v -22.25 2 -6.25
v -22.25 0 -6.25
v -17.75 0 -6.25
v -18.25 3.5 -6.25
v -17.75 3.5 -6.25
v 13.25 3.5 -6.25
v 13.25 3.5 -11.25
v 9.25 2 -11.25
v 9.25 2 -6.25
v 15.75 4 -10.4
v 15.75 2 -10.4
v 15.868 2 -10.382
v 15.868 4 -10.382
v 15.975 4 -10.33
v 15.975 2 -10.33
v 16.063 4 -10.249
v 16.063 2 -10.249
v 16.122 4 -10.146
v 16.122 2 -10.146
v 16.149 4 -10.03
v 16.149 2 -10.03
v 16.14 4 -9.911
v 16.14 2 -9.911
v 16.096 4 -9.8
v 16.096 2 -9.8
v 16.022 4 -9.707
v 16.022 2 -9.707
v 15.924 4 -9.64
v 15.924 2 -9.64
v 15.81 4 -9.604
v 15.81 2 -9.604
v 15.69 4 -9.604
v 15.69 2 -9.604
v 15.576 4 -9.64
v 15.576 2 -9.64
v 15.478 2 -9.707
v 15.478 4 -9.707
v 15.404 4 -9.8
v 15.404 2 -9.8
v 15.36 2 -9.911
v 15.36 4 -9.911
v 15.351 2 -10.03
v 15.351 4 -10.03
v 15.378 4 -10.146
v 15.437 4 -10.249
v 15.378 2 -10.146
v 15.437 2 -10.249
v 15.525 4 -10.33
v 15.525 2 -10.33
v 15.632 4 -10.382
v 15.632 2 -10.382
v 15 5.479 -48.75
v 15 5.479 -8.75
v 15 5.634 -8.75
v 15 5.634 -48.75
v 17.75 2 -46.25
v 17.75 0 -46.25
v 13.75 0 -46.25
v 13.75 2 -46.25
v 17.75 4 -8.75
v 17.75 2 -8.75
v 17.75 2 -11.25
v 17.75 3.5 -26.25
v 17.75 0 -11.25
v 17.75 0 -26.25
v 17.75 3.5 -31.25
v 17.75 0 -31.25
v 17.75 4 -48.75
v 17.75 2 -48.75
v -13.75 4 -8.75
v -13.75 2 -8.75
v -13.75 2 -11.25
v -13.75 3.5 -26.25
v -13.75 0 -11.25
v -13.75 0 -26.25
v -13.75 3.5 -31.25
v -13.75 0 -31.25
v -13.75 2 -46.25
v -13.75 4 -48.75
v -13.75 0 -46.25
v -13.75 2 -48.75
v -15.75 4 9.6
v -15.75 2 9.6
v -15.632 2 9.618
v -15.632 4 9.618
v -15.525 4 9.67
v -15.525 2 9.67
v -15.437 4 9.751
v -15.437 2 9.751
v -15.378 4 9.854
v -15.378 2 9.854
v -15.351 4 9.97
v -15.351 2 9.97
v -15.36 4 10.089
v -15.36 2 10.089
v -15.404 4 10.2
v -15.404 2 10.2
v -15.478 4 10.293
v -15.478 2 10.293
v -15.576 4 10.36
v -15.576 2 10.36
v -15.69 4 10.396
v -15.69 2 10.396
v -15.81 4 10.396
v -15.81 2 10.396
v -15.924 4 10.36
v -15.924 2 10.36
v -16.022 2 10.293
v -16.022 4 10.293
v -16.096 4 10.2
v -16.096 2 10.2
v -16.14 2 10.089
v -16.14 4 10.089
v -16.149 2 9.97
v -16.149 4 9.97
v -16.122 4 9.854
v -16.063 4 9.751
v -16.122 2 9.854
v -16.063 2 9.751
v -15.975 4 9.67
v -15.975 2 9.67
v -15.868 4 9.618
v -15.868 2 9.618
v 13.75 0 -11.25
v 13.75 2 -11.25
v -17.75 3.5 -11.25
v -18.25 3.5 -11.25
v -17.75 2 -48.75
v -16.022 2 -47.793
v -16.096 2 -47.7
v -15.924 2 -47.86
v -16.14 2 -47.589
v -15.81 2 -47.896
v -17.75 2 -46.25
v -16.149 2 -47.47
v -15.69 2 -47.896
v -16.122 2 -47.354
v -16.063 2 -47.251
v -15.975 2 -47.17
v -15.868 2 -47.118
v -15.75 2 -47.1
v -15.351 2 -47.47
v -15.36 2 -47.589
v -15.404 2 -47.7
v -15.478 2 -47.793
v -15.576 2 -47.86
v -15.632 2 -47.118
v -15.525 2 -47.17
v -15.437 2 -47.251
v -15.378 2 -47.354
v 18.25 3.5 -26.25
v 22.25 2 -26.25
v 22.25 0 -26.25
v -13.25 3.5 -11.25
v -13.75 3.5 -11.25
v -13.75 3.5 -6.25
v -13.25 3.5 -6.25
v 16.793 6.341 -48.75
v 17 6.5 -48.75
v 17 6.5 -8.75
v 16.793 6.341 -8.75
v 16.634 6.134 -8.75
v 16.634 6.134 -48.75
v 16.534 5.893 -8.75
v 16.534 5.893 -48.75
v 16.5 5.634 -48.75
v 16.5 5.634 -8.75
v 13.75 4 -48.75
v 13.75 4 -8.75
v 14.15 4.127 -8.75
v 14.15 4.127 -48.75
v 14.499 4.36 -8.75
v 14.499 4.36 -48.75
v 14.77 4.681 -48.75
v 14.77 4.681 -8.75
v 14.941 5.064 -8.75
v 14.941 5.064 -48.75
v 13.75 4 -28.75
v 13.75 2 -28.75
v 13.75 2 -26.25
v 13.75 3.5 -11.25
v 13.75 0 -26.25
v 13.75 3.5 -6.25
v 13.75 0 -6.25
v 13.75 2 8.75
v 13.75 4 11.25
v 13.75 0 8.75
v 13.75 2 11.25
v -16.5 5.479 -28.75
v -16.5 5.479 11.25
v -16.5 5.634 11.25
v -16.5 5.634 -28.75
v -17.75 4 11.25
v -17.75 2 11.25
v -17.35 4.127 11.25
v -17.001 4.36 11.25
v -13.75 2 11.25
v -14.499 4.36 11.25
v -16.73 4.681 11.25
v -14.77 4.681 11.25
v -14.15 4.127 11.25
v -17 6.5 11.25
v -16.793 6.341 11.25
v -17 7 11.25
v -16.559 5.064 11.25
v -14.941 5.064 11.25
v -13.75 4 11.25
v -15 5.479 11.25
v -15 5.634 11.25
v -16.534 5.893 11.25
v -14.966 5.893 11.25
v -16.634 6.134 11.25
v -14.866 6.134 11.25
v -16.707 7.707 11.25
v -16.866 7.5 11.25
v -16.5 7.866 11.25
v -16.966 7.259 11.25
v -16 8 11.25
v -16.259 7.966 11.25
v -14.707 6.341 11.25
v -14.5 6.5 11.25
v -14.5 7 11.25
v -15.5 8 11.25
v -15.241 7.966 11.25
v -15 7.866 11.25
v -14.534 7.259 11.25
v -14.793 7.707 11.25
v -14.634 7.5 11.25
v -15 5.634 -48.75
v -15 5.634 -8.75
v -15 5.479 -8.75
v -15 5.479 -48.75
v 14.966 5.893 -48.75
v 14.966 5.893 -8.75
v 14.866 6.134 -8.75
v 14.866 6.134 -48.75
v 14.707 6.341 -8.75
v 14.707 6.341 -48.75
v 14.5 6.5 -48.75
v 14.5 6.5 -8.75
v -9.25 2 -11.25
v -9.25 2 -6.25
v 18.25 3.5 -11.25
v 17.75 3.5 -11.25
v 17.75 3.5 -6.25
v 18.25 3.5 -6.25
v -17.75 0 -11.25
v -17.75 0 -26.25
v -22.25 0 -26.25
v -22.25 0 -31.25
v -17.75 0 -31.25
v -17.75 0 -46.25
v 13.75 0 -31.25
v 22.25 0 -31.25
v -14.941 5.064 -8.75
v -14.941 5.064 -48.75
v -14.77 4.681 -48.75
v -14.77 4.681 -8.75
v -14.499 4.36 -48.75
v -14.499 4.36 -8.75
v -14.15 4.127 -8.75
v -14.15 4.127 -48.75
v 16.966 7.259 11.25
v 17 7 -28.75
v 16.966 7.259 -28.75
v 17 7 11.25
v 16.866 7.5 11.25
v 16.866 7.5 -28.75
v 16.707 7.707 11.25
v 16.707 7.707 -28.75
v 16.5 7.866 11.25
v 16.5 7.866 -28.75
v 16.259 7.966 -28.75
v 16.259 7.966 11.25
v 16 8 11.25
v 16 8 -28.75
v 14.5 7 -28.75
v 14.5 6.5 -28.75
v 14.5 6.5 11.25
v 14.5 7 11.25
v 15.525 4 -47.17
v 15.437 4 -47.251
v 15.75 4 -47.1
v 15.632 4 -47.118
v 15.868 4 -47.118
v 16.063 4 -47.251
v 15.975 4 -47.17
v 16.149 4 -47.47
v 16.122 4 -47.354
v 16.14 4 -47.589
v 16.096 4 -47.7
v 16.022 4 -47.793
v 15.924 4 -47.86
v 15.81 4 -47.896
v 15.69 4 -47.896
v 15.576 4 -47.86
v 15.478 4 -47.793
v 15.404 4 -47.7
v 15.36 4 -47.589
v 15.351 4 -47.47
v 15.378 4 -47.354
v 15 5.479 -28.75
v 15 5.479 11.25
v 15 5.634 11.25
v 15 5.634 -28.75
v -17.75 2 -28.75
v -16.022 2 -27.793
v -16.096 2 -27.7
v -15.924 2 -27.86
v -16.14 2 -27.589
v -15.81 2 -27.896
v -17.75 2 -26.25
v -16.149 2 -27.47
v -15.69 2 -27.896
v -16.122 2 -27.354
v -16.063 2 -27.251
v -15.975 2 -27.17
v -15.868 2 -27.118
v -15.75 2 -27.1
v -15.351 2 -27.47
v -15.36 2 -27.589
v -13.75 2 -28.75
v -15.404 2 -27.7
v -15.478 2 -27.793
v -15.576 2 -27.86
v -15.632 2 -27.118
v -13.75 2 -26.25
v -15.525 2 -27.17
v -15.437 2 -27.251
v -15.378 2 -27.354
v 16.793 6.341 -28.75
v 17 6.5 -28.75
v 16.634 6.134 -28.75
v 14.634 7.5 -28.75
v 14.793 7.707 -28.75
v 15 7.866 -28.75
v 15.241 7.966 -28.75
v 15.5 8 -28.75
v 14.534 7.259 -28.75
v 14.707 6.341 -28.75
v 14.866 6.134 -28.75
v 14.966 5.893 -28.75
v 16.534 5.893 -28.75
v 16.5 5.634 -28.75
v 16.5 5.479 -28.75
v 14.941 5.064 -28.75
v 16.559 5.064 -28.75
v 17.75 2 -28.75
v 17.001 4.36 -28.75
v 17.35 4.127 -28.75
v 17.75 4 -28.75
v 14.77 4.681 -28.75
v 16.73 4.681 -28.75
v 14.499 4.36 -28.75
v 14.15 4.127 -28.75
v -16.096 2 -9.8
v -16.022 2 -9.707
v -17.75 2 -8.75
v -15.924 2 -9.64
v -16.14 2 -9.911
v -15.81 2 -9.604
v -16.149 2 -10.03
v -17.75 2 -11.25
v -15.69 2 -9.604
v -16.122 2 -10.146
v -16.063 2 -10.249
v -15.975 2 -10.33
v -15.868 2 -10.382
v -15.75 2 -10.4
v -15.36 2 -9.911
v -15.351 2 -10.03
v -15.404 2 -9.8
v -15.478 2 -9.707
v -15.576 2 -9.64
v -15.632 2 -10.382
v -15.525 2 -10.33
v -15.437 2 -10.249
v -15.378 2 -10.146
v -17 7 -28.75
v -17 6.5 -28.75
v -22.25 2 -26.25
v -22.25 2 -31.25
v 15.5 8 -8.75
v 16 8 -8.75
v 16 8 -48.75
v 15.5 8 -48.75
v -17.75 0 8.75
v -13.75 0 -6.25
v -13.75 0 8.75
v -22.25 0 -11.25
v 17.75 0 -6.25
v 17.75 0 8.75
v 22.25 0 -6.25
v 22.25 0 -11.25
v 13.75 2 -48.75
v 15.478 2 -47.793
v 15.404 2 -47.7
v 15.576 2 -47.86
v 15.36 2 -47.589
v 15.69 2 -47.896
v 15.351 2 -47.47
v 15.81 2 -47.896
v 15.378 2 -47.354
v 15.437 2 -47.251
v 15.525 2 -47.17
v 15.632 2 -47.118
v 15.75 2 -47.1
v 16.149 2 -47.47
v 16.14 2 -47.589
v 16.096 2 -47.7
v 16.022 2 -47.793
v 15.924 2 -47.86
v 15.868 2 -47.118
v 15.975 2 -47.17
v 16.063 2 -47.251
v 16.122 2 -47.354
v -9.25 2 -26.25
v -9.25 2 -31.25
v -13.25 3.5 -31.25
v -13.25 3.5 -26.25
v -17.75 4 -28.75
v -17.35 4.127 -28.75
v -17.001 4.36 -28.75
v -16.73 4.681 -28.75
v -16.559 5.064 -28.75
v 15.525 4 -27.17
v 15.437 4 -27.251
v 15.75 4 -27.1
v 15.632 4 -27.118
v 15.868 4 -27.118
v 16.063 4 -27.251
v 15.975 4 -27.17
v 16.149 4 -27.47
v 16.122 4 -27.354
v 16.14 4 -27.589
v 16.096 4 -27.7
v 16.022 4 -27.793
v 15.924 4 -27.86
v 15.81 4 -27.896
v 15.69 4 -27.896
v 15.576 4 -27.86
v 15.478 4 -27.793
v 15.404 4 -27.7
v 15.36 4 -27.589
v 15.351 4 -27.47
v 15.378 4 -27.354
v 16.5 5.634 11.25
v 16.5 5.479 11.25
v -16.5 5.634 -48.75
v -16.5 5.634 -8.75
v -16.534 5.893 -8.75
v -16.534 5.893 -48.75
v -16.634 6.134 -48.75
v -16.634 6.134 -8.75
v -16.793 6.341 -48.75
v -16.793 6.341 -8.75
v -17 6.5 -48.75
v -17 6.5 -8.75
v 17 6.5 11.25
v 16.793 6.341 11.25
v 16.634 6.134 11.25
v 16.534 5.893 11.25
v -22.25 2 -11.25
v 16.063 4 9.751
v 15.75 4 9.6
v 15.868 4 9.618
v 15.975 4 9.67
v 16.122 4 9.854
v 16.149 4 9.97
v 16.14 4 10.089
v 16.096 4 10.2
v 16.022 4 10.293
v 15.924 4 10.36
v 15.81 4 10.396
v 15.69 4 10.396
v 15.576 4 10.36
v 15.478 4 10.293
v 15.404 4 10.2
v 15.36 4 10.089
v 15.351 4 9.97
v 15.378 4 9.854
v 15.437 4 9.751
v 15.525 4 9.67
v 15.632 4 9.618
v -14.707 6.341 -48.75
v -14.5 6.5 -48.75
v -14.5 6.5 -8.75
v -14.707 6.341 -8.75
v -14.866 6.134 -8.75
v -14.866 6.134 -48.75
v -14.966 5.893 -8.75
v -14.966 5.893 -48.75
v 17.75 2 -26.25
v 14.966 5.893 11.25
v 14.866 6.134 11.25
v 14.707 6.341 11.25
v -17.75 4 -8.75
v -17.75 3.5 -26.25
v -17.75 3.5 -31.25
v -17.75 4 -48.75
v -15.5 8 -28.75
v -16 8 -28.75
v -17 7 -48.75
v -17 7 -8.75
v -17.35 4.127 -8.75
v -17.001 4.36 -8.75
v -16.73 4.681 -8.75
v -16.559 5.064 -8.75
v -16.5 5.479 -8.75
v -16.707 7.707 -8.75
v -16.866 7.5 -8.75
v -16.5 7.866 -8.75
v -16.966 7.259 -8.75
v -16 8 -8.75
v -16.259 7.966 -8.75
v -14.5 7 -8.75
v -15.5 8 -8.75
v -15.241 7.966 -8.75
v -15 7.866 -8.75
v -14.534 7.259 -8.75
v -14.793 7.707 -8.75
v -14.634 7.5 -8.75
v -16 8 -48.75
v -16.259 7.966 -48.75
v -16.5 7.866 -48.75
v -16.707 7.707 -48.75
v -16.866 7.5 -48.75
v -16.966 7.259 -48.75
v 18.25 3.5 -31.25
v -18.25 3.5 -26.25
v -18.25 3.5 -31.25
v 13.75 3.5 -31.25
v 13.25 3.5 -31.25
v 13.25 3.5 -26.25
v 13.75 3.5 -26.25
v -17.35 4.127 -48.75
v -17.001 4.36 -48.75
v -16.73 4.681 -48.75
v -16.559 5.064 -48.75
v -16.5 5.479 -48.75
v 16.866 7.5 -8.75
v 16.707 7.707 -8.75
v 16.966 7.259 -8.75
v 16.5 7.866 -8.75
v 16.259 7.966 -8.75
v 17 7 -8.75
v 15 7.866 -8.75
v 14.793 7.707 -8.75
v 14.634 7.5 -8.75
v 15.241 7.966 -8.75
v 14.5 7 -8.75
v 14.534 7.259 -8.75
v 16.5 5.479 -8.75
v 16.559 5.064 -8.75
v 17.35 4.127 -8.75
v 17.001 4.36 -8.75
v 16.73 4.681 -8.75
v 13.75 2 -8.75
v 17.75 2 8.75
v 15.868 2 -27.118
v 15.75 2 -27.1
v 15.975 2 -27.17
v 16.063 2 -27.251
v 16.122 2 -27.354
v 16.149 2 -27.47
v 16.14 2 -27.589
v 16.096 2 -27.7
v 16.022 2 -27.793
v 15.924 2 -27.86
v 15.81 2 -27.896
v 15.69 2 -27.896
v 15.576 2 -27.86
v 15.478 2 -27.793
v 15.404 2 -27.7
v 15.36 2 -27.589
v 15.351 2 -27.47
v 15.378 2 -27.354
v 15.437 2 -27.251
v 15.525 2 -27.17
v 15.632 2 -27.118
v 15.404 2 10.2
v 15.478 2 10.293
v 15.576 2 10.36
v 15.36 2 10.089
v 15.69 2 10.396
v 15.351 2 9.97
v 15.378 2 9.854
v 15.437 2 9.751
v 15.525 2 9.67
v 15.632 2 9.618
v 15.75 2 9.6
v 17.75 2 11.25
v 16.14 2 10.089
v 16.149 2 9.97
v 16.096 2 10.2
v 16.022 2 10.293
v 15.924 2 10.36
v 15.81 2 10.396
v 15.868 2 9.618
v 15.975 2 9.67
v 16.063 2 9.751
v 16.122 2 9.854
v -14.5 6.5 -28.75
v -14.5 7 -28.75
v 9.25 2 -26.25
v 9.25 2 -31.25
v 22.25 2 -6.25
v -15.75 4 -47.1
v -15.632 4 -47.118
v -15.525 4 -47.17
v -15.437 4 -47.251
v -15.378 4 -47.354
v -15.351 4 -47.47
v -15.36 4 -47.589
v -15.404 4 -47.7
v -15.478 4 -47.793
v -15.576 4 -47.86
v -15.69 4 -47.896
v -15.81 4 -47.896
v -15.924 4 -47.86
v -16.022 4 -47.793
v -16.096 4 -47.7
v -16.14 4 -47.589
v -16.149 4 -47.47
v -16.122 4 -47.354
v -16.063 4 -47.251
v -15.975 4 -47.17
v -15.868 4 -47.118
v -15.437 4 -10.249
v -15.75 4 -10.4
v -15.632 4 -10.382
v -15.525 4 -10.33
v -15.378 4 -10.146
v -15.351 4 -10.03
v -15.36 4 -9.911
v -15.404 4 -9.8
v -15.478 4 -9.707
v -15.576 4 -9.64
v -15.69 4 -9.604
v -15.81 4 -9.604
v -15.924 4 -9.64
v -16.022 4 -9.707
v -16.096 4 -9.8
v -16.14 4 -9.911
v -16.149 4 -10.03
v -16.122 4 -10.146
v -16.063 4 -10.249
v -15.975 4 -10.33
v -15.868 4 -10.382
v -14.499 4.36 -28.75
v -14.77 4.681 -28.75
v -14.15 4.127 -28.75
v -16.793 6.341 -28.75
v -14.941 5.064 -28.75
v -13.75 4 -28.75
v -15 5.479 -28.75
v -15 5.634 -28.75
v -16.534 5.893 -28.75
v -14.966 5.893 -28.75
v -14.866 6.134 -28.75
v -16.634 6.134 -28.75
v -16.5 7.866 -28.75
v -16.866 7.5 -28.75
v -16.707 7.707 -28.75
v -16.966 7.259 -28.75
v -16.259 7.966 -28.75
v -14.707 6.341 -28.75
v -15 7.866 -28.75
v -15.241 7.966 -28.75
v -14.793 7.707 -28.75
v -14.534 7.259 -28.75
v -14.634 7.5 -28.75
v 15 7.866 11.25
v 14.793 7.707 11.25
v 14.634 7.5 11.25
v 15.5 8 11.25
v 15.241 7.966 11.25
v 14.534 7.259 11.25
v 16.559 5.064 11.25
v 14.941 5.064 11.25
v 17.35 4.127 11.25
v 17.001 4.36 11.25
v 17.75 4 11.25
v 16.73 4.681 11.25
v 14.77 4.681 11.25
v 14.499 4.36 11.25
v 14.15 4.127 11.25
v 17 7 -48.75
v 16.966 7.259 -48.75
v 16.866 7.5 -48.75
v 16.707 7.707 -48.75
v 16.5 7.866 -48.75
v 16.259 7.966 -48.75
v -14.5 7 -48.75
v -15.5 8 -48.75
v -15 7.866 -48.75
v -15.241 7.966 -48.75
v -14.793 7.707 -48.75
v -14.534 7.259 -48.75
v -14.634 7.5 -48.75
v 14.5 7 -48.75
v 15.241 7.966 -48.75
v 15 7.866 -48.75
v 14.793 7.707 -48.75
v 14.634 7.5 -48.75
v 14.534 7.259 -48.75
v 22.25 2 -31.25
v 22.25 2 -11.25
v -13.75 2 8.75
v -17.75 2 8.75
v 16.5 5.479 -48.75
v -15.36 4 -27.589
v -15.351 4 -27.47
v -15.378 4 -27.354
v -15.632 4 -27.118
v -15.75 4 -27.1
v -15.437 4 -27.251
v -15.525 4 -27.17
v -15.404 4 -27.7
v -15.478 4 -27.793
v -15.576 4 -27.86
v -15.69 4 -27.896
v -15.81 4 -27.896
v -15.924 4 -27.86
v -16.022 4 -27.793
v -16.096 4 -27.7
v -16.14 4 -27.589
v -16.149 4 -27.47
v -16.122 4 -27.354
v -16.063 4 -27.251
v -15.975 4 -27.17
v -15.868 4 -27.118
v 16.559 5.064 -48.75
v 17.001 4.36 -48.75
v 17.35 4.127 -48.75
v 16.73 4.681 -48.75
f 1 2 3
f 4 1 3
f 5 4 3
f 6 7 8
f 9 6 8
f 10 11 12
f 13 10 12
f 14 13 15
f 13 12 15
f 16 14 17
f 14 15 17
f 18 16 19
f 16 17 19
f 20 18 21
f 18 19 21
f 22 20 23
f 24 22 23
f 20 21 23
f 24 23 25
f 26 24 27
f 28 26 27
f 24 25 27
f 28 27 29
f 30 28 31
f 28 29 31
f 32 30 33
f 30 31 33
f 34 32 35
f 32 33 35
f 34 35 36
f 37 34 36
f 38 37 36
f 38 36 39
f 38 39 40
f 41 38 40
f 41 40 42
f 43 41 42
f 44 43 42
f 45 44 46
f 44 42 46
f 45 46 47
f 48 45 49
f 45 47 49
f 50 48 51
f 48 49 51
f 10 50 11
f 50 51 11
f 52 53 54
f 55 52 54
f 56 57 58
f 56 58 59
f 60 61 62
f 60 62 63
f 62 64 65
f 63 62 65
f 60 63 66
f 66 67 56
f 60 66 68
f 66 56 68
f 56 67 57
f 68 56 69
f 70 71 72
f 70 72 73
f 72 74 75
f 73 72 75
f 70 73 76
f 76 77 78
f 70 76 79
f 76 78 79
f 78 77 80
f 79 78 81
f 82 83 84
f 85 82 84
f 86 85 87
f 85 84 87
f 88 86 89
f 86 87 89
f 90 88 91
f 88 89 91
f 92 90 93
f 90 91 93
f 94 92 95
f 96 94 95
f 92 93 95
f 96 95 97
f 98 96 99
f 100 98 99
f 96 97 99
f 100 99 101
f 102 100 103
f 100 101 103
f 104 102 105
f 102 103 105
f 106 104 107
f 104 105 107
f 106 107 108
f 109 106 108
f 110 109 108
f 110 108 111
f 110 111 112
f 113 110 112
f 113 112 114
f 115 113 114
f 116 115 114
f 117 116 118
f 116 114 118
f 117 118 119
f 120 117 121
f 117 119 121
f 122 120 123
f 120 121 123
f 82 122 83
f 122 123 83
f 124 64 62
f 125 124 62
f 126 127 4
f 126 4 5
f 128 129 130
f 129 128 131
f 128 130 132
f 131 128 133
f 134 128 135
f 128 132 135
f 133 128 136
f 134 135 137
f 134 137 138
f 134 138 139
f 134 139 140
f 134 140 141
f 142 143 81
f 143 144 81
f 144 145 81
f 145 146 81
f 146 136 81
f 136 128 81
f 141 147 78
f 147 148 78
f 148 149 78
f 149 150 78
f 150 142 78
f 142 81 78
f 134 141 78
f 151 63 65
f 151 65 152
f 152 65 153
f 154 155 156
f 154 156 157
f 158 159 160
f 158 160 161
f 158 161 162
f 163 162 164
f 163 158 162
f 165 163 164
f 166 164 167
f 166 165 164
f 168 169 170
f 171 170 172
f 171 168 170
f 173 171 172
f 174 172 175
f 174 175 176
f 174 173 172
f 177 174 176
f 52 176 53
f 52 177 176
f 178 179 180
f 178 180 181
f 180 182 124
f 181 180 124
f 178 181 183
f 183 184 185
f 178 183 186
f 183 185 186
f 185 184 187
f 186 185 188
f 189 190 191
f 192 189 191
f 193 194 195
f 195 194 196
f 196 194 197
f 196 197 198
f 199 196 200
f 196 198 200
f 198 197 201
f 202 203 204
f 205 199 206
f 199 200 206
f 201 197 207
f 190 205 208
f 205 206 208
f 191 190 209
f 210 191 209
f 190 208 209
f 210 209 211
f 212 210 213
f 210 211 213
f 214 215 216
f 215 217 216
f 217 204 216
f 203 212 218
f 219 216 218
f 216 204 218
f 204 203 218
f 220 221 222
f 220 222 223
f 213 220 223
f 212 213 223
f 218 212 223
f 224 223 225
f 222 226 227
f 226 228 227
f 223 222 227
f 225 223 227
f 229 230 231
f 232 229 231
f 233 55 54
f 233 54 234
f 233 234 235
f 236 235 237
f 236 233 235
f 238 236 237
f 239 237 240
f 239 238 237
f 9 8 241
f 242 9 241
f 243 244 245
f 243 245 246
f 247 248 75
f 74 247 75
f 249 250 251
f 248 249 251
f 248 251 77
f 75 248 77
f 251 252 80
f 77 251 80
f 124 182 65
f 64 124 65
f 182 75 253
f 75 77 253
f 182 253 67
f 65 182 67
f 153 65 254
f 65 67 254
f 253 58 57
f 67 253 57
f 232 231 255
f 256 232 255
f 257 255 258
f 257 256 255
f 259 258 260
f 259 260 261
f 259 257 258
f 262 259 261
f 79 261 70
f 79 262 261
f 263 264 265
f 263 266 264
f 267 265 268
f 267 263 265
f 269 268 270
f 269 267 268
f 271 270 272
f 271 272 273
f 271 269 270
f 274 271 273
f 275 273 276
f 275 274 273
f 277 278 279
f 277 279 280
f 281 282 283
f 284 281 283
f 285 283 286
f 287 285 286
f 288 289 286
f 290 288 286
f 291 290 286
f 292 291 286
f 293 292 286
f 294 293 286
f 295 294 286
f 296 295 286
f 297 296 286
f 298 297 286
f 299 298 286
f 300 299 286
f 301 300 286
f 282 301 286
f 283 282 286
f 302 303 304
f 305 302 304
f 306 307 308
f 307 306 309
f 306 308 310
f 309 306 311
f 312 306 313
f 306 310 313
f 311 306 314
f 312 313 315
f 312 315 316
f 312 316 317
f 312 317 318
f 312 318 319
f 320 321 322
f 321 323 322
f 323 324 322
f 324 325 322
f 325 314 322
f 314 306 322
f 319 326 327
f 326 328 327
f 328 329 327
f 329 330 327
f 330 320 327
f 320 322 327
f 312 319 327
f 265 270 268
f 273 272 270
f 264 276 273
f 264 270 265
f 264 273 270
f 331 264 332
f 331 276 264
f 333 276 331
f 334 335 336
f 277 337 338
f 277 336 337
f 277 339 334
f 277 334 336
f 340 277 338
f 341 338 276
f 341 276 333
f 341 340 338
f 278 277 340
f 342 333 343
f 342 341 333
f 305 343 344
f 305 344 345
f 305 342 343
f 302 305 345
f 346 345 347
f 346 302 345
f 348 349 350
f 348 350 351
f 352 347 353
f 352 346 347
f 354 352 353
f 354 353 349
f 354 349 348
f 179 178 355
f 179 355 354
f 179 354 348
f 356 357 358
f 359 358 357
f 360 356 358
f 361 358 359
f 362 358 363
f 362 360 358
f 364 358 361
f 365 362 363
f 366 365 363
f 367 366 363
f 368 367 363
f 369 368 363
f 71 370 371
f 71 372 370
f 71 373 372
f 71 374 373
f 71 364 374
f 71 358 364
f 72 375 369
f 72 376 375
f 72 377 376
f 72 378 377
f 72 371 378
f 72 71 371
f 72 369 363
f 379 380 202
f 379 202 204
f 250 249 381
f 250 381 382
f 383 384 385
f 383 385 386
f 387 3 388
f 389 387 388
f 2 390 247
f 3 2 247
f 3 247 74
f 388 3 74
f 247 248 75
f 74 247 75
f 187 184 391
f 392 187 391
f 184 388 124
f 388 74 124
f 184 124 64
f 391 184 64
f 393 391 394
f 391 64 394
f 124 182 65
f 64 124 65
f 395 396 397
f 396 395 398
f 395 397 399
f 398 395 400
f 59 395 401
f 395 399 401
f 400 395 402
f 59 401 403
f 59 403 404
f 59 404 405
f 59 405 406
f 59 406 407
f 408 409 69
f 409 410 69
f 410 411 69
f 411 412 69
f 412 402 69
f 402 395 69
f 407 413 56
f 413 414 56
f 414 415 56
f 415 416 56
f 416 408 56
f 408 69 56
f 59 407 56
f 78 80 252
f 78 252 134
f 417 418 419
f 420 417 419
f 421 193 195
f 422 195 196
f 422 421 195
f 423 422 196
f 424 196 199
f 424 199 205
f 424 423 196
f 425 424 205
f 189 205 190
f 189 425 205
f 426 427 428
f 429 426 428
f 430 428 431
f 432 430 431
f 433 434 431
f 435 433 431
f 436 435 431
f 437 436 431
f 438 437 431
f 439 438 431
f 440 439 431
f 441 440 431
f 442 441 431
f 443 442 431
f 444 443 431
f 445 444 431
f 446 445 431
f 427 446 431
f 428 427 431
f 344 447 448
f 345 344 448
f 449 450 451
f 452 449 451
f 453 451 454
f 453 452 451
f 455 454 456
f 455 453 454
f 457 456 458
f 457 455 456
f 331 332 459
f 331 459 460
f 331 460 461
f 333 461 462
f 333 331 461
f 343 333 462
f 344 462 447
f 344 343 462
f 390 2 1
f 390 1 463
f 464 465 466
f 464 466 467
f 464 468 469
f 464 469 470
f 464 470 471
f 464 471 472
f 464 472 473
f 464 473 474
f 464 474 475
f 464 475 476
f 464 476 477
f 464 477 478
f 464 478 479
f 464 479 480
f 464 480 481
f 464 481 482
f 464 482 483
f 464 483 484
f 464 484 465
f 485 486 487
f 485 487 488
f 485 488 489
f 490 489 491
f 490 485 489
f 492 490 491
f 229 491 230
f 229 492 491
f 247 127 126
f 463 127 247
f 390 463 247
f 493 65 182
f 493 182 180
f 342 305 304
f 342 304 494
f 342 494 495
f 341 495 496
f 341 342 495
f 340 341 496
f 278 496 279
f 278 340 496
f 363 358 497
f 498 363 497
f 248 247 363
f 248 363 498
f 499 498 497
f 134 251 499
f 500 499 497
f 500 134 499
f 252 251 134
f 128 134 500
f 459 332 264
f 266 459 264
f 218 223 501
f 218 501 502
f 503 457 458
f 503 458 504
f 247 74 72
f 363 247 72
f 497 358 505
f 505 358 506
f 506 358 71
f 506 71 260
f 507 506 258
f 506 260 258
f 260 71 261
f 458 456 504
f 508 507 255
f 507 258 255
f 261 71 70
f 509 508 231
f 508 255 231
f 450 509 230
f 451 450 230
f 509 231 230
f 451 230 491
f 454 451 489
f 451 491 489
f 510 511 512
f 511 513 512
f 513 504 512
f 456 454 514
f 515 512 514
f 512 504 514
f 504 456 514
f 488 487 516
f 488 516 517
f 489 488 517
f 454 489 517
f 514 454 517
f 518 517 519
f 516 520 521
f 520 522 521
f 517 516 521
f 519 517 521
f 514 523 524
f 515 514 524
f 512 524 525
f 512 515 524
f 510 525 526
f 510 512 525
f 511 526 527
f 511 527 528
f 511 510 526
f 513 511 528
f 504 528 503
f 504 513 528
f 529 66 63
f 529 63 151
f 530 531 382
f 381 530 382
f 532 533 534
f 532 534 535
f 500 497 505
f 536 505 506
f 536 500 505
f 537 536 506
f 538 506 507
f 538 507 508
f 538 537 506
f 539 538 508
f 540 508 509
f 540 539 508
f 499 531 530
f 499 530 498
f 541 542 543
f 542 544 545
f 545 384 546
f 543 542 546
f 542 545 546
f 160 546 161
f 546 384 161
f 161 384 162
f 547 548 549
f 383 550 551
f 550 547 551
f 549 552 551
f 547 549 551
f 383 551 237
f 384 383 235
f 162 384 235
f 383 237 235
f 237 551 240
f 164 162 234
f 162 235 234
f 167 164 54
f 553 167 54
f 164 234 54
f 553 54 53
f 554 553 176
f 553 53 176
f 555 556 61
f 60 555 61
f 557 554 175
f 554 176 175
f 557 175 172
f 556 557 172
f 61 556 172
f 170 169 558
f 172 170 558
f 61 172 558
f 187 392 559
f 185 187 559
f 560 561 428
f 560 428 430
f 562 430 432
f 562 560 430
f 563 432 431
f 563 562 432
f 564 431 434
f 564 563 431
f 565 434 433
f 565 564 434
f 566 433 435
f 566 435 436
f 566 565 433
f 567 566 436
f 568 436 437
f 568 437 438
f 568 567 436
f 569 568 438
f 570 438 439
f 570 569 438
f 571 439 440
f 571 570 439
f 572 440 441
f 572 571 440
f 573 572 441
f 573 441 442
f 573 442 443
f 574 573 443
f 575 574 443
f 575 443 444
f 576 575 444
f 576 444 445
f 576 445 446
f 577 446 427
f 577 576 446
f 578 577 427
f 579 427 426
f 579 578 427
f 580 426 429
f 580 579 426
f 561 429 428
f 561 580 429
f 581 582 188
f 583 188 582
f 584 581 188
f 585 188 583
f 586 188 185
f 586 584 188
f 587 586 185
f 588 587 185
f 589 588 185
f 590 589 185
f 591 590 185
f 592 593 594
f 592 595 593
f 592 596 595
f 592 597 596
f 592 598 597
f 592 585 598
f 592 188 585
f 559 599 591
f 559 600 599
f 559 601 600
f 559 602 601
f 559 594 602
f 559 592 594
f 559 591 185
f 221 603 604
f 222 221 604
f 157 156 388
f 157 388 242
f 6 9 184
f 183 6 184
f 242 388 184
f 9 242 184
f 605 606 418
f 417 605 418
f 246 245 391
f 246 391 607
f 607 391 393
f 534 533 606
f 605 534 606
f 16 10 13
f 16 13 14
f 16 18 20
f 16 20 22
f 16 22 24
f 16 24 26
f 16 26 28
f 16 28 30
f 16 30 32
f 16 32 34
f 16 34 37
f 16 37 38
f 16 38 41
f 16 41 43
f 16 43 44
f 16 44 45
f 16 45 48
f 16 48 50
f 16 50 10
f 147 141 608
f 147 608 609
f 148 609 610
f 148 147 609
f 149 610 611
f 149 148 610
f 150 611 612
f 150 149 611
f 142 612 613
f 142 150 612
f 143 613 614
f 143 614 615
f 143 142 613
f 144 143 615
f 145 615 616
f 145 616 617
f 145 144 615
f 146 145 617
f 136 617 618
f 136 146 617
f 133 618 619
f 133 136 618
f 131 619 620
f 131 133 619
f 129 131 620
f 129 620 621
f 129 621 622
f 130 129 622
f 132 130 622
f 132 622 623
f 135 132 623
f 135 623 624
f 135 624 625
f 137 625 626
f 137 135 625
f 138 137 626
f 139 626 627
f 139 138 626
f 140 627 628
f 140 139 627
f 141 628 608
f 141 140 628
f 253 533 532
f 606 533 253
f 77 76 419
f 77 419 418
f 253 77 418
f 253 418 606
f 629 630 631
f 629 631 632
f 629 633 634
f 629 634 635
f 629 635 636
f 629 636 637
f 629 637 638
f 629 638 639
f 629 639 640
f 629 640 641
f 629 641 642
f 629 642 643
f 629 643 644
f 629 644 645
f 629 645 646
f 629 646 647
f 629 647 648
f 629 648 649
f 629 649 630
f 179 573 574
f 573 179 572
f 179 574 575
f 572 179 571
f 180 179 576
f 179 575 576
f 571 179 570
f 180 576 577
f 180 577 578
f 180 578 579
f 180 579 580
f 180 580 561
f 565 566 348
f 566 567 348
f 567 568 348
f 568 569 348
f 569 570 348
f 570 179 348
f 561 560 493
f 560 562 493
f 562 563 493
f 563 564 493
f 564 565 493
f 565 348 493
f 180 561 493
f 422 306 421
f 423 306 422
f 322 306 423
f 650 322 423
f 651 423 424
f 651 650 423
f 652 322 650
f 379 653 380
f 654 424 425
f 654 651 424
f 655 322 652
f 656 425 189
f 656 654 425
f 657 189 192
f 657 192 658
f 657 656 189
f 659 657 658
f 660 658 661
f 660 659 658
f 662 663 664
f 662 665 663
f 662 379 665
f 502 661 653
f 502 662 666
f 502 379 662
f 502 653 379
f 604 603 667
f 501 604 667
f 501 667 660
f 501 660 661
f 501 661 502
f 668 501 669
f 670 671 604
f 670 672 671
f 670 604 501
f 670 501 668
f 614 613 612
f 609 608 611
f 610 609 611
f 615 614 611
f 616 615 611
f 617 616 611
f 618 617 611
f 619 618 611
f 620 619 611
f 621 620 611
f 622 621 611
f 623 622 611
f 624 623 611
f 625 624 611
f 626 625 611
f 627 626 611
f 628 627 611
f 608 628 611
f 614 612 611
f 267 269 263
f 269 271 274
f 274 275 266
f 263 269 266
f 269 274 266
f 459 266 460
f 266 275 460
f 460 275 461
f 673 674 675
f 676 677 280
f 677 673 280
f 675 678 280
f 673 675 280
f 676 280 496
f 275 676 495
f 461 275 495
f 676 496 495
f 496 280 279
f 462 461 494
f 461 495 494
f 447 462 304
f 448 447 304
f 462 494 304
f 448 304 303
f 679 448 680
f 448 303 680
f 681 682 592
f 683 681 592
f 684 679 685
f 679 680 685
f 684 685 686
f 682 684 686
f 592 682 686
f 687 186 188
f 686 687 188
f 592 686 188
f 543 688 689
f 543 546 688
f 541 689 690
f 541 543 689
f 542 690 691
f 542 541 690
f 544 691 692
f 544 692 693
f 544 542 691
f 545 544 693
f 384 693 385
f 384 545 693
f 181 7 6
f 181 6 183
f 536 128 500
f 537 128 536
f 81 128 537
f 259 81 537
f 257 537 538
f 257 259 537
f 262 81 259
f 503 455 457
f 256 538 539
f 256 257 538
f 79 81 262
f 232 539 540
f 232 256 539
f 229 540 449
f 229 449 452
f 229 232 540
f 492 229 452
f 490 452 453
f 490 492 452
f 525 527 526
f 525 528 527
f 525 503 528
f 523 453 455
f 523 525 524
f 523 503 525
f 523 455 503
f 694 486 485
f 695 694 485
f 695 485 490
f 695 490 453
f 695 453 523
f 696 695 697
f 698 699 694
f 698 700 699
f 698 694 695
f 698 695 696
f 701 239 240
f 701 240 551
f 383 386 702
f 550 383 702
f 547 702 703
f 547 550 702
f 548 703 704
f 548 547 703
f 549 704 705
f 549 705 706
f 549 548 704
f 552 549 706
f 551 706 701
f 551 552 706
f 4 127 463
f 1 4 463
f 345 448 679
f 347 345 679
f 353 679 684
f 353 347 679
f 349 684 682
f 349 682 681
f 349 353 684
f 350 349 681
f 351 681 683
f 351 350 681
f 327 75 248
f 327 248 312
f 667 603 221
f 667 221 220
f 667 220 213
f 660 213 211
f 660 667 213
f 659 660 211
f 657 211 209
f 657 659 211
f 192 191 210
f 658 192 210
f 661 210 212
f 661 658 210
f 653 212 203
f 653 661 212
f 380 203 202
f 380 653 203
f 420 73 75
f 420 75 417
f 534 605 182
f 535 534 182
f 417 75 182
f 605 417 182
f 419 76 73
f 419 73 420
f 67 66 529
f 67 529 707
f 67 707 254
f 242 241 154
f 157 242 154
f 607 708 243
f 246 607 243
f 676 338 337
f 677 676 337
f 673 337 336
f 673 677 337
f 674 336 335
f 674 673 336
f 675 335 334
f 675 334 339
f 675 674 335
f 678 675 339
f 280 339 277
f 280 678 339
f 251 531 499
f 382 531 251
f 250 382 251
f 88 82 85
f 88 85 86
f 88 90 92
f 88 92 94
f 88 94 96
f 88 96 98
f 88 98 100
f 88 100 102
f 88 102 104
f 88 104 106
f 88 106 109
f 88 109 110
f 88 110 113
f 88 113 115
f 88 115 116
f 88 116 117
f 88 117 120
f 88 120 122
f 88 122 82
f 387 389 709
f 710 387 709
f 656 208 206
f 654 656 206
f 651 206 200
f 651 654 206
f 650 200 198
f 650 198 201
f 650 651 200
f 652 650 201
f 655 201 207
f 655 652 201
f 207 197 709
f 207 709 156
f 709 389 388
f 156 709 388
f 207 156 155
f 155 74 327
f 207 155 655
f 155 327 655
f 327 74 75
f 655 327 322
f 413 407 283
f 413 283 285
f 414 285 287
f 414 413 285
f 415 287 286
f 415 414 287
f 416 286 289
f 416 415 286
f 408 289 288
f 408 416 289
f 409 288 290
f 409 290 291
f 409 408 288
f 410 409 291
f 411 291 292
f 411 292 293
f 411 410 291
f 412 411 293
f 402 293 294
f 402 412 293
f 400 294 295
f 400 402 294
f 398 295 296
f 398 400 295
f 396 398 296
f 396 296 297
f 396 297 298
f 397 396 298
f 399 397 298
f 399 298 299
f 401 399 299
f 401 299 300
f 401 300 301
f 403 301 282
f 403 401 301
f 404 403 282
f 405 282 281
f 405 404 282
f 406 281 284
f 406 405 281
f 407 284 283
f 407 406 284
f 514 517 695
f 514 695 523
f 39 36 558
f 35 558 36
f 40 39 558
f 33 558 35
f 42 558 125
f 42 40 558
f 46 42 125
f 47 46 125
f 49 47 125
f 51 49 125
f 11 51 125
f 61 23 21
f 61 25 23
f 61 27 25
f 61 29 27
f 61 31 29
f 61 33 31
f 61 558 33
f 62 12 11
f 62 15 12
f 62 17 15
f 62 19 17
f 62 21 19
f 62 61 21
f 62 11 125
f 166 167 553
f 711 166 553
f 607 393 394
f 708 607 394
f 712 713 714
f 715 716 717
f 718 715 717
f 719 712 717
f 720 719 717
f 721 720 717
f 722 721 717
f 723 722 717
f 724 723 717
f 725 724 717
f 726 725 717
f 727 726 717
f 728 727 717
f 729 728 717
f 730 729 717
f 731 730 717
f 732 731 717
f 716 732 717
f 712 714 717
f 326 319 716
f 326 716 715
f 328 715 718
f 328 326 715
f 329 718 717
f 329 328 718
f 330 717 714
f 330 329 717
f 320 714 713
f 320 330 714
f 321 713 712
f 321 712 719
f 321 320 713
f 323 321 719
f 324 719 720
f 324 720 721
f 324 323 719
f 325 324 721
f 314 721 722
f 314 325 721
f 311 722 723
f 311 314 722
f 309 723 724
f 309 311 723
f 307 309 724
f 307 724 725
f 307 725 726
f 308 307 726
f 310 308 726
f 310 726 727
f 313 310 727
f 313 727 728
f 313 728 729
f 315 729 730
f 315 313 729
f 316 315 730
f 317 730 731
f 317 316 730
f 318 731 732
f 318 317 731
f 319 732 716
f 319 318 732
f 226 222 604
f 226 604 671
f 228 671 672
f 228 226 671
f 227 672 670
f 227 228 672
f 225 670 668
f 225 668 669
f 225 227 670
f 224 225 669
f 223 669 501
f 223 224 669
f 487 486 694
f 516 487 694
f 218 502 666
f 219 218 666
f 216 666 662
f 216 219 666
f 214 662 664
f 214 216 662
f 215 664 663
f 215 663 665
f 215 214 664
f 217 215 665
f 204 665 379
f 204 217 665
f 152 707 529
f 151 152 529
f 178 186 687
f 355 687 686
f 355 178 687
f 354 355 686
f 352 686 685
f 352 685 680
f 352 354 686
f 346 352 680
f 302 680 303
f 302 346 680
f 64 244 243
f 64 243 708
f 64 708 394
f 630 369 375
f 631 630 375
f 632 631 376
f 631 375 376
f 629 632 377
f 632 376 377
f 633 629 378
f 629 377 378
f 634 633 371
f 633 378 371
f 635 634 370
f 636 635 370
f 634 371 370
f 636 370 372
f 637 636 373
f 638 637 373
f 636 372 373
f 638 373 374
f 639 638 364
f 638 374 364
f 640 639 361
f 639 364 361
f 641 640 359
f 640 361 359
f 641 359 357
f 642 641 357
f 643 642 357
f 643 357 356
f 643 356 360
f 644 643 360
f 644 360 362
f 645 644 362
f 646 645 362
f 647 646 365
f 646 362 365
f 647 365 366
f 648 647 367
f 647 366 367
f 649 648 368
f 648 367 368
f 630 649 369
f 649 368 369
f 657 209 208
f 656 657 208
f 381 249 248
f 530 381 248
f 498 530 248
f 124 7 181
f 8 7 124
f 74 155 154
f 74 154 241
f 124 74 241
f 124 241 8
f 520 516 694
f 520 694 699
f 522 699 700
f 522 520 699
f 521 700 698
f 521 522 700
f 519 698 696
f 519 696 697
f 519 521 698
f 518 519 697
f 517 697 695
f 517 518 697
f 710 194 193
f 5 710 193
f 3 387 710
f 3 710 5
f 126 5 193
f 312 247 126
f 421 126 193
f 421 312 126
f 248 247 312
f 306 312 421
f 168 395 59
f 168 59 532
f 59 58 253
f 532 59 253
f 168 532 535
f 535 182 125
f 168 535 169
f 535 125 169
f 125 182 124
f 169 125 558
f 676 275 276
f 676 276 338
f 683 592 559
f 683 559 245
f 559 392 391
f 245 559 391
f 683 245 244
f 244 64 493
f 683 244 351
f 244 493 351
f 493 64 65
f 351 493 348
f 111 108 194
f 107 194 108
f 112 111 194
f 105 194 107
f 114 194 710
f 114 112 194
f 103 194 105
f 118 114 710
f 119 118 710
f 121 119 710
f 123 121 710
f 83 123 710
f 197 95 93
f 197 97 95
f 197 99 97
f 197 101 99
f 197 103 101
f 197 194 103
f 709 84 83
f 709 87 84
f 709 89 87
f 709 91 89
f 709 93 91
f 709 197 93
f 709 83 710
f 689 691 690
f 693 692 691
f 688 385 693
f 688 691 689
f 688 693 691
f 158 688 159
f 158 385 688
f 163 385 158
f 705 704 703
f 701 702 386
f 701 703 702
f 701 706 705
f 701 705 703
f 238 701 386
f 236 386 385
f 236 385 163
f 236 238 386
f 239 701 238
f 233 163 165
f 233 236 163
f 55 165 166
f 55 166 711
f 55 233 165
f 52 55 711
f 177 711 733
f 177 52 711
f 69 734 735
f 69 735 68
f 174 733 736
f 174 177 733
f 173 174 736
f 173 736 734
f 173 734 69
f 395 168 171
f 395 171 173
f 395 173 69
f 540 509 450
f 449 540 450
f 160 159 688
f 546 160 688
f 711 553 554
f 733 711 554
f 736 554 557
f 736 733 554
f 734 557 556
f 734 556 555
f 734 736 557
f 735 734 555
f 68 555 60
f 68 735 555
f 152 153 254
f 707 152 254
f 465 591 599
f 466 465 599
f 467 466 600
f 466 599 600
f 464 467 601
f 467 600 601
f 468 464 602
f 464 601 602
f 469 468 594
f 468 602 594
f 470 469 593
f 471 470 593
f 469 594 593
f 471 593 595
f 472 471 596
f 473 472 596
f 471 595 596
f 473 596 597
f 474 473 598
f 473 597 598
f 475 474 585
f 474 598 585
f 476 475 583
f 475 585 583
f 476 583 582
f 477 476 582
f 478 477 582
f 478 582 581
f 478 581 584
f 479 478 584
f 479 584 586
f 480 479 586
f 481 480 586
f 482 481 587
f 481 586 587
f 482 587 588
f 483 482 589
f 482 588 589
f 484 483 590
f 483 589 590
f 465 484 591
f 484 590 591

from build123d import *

# Parameters (mm, degrees)
SKETCH_1_W             = 4
SKETCH_1_H             = 17.5
SKETCH_1_H_2           = 5
EXTRUDE_1_DEPTH        = 4
SKETCH_1_7_W           = 44.5
SKETCH_1_7_H           = 5
EXTRUDE_2_DEPTH        = 3.5
SKETCH_2_W             = 18.5
SKETCH_2_H             = 1.5
CUT_EXTRUDE_1_DEPTH    = 32.89533665
SKETCH_2_3_W           = 2.5
SKETCH_2_3_H           = 1.5
EXTRUDE_4_DEPTH        = 22.5
FILLET_1_R             = 1
FILLET_2_R             = 1.5
FILLET_3_R             = 1
SKETCH_5_W             = 2.5
SKETCH_5_H             = 2
CUT_EXTRUDE_2_DEPTH    = 43.315038698
SKETCH_10_R            = 0.4
CUT_EXTRUDE_3_DEPTH    = 2
PATTERN_LINEAR_2_COUNT = 2
PATTERN_LINEAR_2_PITCH = 20


with BuildPart() as part:
    # 草图1 → 凸台-拉伸1 (new body)
    with BuildSketch(Plane(origin=(0, 0, 0), x_dir=(1, 0, 0), z_dir=(0, 1, 0))):
        with Locations((-15.75, -2.5)):
            Rectangle(SKETCH_1_W, SKETCH_1_H)
        with Locations((15.75, -2.5)):
            Rectangle(SKETCH_1_W, SKETCH_1_H)
        with Locations((15.75, 8.75)):
            Rectangle(SKETCH_1_W, SKETCH_1_H_2)
        with Locations((-15.75, 8.75)):
            Rectangle(SKETCH_1_W, SKETCH_1_H_2)
    extrude(amount=EXTRUDE_1_DEPTH)

    # 草图1<7> → 凸台-拉伸2 (add)
    with BuildSketch(Plane(origin=(0, 0, 0), x_dir=(1, 0, 0), z_dir=(0, 1, 0))):
        with Locations((0, 8.75)):
            Rectangle(SKETCH_1_7_W, SKETCH_1_7_H)
    extrude(amount=EXTRUDE_2_DEPTH)

    # 草图2 → 切除-拉伸1 (cut, through all)
    with BuildSketch(Plane(origin=(0, 0, -11.25), x_dir=(-1, 0, 0), z_dir=(0, 0, -1))):
        with Locations((0, 2.75)):
            Rectangle(SKETCH_2_W, SKETCH_2_H)
        Polygon((13.25, 3.5), (9.25, 3.5), (9.25, 2), align=None)
        Polygon((-9.25, 3.5), (-13.25, 3.5), (-9.25, 2), align=None)
        Polygon((-22.25, 3.5), (-22.25, 2), (-18.25, 3.5), align=None)
        Polygon((22.25, 3.5), (18.25, 3.5), (22.25, 2), align=None)
    extrude(amount=-CUT_EXTRUDE_1_DEPTH, mode=Mode.SUBTRACT)

    # 草图2<3> → 凸台-拉伸4 (add, through all)
    with BuildSketch(Plane(origin=(0, 0, -11.25), x_dir=(-1, 0, 0), z_dir=(0, 0, -1))):
        with Locations((-15.75, 7.25)):
            Rectangle(SKETCH_2_3_W, SKETCH_2_3_H)
        Polygon((-15, 6.5), (-16.5, 6.5), (-16.5, 4), (-15.75, 4), (-15, 4), align=None)
        with Locations((15.75, 7.25)):
            Rectangle(SKETCH_2_3_W, SKETCH_2_3_H)
        Polygon((16.5, 6.5), (15, 6.5), (15, 4), (15.75, 4), (16.5, 4), align=None)
    extrude(amount=-EXTRUDE_4_DEPTH)

    # 圆角1
    # the kernel refuses this fillet: 1 mm, written as the material it adds along each edge
    with BuildSketch(Plane(origin=(-16.5, 6.5, -11.25), x_dir=(0, -1, 0), z_dir=(0, 0, 1))) as fillet_1_piece_1:
        with BuildLine():
            CenterArc((0.866025404, -1), FILLET_1_R, 90, 60)
            Line((0, -0.5), (-0.017320508, -0.49))
            ThreePointArc((-0.017320508, -0.49), (-0.02, -0.25), (-0.02, 0))
            Line((-0.02, 0), (0, 0.02))
            Line((0, 0.02), (0.866025404, 0.02))
            Line((0.866025404, 0.02), (0.866025404, 0))
        make_face()
    extrude(amount=22.5)
    with BuildSketch(Plane(origin=(-15, 6.5, -11.25), x_dir=(0, -1, 0), z_dir=(0, 0, 1)), Plane(origin=(16.5, 6.5, -11.25), x_dir=(0, -1, 0), z_dir=(0, 0, 1))) as fillet_1_piece_2:
        with BuildLine():
            CenterArc((0.866025404, 1), FILLET_1_R, 210, 60)
            Line((0, 0.5), (-0.017320508, 0.49))
            ThreePointArc((-0.017320508, 0.49), (-0.02, 0.25), (-0.02, 0))
            Line((-0.02, 0), (0, -0.02))
            Line((0, -0.02), (0.866025404, -0.02))
            Line((0.866025404, -0.02), (0.866025404, 0))
        make_face()
    extrude(amount=22.5)
    with BuildSketch(Plane(origin=(15, 6.5, -11.25), x_dir=(-1, 0, 0), z_dir=(0, 0, 1))) as fillet_1_piece_3:
        with BuildLine():
            CenterArc((1, 0.866025404), FILLET_1_R, 180, 60)
            Line((0, 0.866025404), (-0.02, 0.866025404))
            Line((-0.02, 0.866025404), (-0.02, 0))
            Line((-0.02, 0), (0, -0.02))
            ThreePointArc((0, -0.02), (0.25, -0.02), (0.49, -0.017320508))
            Line((0.49, -0.017320508), (0.5, 0))
        make_face()
    extrude(amount=22.5)

    # 圆角2
    # the kernel refuses this fillet: 1.5 mm, written as the material it adds along each edge
    with BuildSketch(Plane(origin=(16.5, 4, -11.25), x_dir=(1, 0, 0), z_dir=(0, 0, 1)), Plane(origin=(-15, 4, -11.25), x_dir=(1, 0, 0), z_dir=(0, 0, 1))) as fillet_2_piece_1:
        with BuildLine():
            CenterArc((1.5, 1.479019946), FILLET_2_R, 180, 80.405931773)
            Line((0, 1.479019946), (-0.03, 1.479019946))
            Line((-0.03, 1.479019946), (-0.03, 0))
            Line((-0.03, 0), (0, -0.03))
            ThreePointArc((0, -0.03), (0.625, -0.03), (1.245, -0.029580399))
            Line((1.245, -0.029580399), (1.25, 0))
        make_face()
    extrude(amount=22.5)
    with BuildSketch(Plane(origin=(15, 4, -11.25), x_dir=(0, 1, 0), z_dir=(0, 0, 1)), Plane(origin=(-16.5, 4, -11.25), x_dir=(0, 1, 0), z_dir=(0, 0, 1))) as fillet_2_piece_2:
        with BuildLine():
            CenterArc((1.479019946, 1.5), FILLET_2_R, 189.594068227, 80.405931773)
            Line((0, 1.25), (-0.029580399, 1.245))
            ThreePointArc((-0.029580399, 1.245), (-0.03, 0.625), (-0.03, 0))
            Line((-0.03, 0), (0, -0.03))
            Line((0, -0.03), (1.479019946, -0.03))
            Line((1.479019946, -0.03), (1.479019946, 0))
        make_face()
    extrude(amount=22.5)

    # 圆角3
    fillet_3_edges = [part.edges().sort_by_distance(p)[0] for p in [
        (14.5, 8, 0),
        (17, 8, 0),
        (-17, 8, 0),
        (-14.5, 8, 0),
    ]]
    fillet(fillet_3_edges, radius=FILLET_3_R)

    # 草图5 → 切除-拉伸2 (cut, through all)
    with BuildSketch(Plane(origin=(17.75, 0, 0), x_dir=(0, 0, -1), z_dir=(1, 0, 0))):
        with Locations((-10, 1)):
            Rectangle(SKETCH_5_W, SKETCH_5_H)
    extrude(amount=-CUT_EXTRUDE_2_DEPTH, mode=Mode.SUBTRACT)

    # 草图10 → 切除-拉伸3 (cut)
    with BuildSketch(Plane.XZ.offset(-2)):
        with Locations(Location((15.75, 10, 0), (0, 0, 270))):
            Circle(SKETCH_10_R)
        with Locations(Location((-15.75, 10, 0), (0, 0, 270))):
            Circle(SKETCH_10_R)
    extrude(amount=-CUT_EXTRUDE_3_DEPTH, mode=Mode.SUBTRACT)

    # 镜向1: part across plane


with BuildPart() as part_1:
    add(part.part)
    add(part.part.mirror(Plane(origin=(0, 0, -8.75), x_dir=(1, 0, 0), z_dir=(0, 0, -1))))


with BuildPart() as pattern_linear_2_1:
    # 阵列(线性)2: pattern copy
    add(part_1.part.moved(Location(Vector(0, 0, -1) * (1 * PATTERN_LINEAR_2_PITCH))))


solid = Compound([part_1.part, pattern_linear_2_1.part])
